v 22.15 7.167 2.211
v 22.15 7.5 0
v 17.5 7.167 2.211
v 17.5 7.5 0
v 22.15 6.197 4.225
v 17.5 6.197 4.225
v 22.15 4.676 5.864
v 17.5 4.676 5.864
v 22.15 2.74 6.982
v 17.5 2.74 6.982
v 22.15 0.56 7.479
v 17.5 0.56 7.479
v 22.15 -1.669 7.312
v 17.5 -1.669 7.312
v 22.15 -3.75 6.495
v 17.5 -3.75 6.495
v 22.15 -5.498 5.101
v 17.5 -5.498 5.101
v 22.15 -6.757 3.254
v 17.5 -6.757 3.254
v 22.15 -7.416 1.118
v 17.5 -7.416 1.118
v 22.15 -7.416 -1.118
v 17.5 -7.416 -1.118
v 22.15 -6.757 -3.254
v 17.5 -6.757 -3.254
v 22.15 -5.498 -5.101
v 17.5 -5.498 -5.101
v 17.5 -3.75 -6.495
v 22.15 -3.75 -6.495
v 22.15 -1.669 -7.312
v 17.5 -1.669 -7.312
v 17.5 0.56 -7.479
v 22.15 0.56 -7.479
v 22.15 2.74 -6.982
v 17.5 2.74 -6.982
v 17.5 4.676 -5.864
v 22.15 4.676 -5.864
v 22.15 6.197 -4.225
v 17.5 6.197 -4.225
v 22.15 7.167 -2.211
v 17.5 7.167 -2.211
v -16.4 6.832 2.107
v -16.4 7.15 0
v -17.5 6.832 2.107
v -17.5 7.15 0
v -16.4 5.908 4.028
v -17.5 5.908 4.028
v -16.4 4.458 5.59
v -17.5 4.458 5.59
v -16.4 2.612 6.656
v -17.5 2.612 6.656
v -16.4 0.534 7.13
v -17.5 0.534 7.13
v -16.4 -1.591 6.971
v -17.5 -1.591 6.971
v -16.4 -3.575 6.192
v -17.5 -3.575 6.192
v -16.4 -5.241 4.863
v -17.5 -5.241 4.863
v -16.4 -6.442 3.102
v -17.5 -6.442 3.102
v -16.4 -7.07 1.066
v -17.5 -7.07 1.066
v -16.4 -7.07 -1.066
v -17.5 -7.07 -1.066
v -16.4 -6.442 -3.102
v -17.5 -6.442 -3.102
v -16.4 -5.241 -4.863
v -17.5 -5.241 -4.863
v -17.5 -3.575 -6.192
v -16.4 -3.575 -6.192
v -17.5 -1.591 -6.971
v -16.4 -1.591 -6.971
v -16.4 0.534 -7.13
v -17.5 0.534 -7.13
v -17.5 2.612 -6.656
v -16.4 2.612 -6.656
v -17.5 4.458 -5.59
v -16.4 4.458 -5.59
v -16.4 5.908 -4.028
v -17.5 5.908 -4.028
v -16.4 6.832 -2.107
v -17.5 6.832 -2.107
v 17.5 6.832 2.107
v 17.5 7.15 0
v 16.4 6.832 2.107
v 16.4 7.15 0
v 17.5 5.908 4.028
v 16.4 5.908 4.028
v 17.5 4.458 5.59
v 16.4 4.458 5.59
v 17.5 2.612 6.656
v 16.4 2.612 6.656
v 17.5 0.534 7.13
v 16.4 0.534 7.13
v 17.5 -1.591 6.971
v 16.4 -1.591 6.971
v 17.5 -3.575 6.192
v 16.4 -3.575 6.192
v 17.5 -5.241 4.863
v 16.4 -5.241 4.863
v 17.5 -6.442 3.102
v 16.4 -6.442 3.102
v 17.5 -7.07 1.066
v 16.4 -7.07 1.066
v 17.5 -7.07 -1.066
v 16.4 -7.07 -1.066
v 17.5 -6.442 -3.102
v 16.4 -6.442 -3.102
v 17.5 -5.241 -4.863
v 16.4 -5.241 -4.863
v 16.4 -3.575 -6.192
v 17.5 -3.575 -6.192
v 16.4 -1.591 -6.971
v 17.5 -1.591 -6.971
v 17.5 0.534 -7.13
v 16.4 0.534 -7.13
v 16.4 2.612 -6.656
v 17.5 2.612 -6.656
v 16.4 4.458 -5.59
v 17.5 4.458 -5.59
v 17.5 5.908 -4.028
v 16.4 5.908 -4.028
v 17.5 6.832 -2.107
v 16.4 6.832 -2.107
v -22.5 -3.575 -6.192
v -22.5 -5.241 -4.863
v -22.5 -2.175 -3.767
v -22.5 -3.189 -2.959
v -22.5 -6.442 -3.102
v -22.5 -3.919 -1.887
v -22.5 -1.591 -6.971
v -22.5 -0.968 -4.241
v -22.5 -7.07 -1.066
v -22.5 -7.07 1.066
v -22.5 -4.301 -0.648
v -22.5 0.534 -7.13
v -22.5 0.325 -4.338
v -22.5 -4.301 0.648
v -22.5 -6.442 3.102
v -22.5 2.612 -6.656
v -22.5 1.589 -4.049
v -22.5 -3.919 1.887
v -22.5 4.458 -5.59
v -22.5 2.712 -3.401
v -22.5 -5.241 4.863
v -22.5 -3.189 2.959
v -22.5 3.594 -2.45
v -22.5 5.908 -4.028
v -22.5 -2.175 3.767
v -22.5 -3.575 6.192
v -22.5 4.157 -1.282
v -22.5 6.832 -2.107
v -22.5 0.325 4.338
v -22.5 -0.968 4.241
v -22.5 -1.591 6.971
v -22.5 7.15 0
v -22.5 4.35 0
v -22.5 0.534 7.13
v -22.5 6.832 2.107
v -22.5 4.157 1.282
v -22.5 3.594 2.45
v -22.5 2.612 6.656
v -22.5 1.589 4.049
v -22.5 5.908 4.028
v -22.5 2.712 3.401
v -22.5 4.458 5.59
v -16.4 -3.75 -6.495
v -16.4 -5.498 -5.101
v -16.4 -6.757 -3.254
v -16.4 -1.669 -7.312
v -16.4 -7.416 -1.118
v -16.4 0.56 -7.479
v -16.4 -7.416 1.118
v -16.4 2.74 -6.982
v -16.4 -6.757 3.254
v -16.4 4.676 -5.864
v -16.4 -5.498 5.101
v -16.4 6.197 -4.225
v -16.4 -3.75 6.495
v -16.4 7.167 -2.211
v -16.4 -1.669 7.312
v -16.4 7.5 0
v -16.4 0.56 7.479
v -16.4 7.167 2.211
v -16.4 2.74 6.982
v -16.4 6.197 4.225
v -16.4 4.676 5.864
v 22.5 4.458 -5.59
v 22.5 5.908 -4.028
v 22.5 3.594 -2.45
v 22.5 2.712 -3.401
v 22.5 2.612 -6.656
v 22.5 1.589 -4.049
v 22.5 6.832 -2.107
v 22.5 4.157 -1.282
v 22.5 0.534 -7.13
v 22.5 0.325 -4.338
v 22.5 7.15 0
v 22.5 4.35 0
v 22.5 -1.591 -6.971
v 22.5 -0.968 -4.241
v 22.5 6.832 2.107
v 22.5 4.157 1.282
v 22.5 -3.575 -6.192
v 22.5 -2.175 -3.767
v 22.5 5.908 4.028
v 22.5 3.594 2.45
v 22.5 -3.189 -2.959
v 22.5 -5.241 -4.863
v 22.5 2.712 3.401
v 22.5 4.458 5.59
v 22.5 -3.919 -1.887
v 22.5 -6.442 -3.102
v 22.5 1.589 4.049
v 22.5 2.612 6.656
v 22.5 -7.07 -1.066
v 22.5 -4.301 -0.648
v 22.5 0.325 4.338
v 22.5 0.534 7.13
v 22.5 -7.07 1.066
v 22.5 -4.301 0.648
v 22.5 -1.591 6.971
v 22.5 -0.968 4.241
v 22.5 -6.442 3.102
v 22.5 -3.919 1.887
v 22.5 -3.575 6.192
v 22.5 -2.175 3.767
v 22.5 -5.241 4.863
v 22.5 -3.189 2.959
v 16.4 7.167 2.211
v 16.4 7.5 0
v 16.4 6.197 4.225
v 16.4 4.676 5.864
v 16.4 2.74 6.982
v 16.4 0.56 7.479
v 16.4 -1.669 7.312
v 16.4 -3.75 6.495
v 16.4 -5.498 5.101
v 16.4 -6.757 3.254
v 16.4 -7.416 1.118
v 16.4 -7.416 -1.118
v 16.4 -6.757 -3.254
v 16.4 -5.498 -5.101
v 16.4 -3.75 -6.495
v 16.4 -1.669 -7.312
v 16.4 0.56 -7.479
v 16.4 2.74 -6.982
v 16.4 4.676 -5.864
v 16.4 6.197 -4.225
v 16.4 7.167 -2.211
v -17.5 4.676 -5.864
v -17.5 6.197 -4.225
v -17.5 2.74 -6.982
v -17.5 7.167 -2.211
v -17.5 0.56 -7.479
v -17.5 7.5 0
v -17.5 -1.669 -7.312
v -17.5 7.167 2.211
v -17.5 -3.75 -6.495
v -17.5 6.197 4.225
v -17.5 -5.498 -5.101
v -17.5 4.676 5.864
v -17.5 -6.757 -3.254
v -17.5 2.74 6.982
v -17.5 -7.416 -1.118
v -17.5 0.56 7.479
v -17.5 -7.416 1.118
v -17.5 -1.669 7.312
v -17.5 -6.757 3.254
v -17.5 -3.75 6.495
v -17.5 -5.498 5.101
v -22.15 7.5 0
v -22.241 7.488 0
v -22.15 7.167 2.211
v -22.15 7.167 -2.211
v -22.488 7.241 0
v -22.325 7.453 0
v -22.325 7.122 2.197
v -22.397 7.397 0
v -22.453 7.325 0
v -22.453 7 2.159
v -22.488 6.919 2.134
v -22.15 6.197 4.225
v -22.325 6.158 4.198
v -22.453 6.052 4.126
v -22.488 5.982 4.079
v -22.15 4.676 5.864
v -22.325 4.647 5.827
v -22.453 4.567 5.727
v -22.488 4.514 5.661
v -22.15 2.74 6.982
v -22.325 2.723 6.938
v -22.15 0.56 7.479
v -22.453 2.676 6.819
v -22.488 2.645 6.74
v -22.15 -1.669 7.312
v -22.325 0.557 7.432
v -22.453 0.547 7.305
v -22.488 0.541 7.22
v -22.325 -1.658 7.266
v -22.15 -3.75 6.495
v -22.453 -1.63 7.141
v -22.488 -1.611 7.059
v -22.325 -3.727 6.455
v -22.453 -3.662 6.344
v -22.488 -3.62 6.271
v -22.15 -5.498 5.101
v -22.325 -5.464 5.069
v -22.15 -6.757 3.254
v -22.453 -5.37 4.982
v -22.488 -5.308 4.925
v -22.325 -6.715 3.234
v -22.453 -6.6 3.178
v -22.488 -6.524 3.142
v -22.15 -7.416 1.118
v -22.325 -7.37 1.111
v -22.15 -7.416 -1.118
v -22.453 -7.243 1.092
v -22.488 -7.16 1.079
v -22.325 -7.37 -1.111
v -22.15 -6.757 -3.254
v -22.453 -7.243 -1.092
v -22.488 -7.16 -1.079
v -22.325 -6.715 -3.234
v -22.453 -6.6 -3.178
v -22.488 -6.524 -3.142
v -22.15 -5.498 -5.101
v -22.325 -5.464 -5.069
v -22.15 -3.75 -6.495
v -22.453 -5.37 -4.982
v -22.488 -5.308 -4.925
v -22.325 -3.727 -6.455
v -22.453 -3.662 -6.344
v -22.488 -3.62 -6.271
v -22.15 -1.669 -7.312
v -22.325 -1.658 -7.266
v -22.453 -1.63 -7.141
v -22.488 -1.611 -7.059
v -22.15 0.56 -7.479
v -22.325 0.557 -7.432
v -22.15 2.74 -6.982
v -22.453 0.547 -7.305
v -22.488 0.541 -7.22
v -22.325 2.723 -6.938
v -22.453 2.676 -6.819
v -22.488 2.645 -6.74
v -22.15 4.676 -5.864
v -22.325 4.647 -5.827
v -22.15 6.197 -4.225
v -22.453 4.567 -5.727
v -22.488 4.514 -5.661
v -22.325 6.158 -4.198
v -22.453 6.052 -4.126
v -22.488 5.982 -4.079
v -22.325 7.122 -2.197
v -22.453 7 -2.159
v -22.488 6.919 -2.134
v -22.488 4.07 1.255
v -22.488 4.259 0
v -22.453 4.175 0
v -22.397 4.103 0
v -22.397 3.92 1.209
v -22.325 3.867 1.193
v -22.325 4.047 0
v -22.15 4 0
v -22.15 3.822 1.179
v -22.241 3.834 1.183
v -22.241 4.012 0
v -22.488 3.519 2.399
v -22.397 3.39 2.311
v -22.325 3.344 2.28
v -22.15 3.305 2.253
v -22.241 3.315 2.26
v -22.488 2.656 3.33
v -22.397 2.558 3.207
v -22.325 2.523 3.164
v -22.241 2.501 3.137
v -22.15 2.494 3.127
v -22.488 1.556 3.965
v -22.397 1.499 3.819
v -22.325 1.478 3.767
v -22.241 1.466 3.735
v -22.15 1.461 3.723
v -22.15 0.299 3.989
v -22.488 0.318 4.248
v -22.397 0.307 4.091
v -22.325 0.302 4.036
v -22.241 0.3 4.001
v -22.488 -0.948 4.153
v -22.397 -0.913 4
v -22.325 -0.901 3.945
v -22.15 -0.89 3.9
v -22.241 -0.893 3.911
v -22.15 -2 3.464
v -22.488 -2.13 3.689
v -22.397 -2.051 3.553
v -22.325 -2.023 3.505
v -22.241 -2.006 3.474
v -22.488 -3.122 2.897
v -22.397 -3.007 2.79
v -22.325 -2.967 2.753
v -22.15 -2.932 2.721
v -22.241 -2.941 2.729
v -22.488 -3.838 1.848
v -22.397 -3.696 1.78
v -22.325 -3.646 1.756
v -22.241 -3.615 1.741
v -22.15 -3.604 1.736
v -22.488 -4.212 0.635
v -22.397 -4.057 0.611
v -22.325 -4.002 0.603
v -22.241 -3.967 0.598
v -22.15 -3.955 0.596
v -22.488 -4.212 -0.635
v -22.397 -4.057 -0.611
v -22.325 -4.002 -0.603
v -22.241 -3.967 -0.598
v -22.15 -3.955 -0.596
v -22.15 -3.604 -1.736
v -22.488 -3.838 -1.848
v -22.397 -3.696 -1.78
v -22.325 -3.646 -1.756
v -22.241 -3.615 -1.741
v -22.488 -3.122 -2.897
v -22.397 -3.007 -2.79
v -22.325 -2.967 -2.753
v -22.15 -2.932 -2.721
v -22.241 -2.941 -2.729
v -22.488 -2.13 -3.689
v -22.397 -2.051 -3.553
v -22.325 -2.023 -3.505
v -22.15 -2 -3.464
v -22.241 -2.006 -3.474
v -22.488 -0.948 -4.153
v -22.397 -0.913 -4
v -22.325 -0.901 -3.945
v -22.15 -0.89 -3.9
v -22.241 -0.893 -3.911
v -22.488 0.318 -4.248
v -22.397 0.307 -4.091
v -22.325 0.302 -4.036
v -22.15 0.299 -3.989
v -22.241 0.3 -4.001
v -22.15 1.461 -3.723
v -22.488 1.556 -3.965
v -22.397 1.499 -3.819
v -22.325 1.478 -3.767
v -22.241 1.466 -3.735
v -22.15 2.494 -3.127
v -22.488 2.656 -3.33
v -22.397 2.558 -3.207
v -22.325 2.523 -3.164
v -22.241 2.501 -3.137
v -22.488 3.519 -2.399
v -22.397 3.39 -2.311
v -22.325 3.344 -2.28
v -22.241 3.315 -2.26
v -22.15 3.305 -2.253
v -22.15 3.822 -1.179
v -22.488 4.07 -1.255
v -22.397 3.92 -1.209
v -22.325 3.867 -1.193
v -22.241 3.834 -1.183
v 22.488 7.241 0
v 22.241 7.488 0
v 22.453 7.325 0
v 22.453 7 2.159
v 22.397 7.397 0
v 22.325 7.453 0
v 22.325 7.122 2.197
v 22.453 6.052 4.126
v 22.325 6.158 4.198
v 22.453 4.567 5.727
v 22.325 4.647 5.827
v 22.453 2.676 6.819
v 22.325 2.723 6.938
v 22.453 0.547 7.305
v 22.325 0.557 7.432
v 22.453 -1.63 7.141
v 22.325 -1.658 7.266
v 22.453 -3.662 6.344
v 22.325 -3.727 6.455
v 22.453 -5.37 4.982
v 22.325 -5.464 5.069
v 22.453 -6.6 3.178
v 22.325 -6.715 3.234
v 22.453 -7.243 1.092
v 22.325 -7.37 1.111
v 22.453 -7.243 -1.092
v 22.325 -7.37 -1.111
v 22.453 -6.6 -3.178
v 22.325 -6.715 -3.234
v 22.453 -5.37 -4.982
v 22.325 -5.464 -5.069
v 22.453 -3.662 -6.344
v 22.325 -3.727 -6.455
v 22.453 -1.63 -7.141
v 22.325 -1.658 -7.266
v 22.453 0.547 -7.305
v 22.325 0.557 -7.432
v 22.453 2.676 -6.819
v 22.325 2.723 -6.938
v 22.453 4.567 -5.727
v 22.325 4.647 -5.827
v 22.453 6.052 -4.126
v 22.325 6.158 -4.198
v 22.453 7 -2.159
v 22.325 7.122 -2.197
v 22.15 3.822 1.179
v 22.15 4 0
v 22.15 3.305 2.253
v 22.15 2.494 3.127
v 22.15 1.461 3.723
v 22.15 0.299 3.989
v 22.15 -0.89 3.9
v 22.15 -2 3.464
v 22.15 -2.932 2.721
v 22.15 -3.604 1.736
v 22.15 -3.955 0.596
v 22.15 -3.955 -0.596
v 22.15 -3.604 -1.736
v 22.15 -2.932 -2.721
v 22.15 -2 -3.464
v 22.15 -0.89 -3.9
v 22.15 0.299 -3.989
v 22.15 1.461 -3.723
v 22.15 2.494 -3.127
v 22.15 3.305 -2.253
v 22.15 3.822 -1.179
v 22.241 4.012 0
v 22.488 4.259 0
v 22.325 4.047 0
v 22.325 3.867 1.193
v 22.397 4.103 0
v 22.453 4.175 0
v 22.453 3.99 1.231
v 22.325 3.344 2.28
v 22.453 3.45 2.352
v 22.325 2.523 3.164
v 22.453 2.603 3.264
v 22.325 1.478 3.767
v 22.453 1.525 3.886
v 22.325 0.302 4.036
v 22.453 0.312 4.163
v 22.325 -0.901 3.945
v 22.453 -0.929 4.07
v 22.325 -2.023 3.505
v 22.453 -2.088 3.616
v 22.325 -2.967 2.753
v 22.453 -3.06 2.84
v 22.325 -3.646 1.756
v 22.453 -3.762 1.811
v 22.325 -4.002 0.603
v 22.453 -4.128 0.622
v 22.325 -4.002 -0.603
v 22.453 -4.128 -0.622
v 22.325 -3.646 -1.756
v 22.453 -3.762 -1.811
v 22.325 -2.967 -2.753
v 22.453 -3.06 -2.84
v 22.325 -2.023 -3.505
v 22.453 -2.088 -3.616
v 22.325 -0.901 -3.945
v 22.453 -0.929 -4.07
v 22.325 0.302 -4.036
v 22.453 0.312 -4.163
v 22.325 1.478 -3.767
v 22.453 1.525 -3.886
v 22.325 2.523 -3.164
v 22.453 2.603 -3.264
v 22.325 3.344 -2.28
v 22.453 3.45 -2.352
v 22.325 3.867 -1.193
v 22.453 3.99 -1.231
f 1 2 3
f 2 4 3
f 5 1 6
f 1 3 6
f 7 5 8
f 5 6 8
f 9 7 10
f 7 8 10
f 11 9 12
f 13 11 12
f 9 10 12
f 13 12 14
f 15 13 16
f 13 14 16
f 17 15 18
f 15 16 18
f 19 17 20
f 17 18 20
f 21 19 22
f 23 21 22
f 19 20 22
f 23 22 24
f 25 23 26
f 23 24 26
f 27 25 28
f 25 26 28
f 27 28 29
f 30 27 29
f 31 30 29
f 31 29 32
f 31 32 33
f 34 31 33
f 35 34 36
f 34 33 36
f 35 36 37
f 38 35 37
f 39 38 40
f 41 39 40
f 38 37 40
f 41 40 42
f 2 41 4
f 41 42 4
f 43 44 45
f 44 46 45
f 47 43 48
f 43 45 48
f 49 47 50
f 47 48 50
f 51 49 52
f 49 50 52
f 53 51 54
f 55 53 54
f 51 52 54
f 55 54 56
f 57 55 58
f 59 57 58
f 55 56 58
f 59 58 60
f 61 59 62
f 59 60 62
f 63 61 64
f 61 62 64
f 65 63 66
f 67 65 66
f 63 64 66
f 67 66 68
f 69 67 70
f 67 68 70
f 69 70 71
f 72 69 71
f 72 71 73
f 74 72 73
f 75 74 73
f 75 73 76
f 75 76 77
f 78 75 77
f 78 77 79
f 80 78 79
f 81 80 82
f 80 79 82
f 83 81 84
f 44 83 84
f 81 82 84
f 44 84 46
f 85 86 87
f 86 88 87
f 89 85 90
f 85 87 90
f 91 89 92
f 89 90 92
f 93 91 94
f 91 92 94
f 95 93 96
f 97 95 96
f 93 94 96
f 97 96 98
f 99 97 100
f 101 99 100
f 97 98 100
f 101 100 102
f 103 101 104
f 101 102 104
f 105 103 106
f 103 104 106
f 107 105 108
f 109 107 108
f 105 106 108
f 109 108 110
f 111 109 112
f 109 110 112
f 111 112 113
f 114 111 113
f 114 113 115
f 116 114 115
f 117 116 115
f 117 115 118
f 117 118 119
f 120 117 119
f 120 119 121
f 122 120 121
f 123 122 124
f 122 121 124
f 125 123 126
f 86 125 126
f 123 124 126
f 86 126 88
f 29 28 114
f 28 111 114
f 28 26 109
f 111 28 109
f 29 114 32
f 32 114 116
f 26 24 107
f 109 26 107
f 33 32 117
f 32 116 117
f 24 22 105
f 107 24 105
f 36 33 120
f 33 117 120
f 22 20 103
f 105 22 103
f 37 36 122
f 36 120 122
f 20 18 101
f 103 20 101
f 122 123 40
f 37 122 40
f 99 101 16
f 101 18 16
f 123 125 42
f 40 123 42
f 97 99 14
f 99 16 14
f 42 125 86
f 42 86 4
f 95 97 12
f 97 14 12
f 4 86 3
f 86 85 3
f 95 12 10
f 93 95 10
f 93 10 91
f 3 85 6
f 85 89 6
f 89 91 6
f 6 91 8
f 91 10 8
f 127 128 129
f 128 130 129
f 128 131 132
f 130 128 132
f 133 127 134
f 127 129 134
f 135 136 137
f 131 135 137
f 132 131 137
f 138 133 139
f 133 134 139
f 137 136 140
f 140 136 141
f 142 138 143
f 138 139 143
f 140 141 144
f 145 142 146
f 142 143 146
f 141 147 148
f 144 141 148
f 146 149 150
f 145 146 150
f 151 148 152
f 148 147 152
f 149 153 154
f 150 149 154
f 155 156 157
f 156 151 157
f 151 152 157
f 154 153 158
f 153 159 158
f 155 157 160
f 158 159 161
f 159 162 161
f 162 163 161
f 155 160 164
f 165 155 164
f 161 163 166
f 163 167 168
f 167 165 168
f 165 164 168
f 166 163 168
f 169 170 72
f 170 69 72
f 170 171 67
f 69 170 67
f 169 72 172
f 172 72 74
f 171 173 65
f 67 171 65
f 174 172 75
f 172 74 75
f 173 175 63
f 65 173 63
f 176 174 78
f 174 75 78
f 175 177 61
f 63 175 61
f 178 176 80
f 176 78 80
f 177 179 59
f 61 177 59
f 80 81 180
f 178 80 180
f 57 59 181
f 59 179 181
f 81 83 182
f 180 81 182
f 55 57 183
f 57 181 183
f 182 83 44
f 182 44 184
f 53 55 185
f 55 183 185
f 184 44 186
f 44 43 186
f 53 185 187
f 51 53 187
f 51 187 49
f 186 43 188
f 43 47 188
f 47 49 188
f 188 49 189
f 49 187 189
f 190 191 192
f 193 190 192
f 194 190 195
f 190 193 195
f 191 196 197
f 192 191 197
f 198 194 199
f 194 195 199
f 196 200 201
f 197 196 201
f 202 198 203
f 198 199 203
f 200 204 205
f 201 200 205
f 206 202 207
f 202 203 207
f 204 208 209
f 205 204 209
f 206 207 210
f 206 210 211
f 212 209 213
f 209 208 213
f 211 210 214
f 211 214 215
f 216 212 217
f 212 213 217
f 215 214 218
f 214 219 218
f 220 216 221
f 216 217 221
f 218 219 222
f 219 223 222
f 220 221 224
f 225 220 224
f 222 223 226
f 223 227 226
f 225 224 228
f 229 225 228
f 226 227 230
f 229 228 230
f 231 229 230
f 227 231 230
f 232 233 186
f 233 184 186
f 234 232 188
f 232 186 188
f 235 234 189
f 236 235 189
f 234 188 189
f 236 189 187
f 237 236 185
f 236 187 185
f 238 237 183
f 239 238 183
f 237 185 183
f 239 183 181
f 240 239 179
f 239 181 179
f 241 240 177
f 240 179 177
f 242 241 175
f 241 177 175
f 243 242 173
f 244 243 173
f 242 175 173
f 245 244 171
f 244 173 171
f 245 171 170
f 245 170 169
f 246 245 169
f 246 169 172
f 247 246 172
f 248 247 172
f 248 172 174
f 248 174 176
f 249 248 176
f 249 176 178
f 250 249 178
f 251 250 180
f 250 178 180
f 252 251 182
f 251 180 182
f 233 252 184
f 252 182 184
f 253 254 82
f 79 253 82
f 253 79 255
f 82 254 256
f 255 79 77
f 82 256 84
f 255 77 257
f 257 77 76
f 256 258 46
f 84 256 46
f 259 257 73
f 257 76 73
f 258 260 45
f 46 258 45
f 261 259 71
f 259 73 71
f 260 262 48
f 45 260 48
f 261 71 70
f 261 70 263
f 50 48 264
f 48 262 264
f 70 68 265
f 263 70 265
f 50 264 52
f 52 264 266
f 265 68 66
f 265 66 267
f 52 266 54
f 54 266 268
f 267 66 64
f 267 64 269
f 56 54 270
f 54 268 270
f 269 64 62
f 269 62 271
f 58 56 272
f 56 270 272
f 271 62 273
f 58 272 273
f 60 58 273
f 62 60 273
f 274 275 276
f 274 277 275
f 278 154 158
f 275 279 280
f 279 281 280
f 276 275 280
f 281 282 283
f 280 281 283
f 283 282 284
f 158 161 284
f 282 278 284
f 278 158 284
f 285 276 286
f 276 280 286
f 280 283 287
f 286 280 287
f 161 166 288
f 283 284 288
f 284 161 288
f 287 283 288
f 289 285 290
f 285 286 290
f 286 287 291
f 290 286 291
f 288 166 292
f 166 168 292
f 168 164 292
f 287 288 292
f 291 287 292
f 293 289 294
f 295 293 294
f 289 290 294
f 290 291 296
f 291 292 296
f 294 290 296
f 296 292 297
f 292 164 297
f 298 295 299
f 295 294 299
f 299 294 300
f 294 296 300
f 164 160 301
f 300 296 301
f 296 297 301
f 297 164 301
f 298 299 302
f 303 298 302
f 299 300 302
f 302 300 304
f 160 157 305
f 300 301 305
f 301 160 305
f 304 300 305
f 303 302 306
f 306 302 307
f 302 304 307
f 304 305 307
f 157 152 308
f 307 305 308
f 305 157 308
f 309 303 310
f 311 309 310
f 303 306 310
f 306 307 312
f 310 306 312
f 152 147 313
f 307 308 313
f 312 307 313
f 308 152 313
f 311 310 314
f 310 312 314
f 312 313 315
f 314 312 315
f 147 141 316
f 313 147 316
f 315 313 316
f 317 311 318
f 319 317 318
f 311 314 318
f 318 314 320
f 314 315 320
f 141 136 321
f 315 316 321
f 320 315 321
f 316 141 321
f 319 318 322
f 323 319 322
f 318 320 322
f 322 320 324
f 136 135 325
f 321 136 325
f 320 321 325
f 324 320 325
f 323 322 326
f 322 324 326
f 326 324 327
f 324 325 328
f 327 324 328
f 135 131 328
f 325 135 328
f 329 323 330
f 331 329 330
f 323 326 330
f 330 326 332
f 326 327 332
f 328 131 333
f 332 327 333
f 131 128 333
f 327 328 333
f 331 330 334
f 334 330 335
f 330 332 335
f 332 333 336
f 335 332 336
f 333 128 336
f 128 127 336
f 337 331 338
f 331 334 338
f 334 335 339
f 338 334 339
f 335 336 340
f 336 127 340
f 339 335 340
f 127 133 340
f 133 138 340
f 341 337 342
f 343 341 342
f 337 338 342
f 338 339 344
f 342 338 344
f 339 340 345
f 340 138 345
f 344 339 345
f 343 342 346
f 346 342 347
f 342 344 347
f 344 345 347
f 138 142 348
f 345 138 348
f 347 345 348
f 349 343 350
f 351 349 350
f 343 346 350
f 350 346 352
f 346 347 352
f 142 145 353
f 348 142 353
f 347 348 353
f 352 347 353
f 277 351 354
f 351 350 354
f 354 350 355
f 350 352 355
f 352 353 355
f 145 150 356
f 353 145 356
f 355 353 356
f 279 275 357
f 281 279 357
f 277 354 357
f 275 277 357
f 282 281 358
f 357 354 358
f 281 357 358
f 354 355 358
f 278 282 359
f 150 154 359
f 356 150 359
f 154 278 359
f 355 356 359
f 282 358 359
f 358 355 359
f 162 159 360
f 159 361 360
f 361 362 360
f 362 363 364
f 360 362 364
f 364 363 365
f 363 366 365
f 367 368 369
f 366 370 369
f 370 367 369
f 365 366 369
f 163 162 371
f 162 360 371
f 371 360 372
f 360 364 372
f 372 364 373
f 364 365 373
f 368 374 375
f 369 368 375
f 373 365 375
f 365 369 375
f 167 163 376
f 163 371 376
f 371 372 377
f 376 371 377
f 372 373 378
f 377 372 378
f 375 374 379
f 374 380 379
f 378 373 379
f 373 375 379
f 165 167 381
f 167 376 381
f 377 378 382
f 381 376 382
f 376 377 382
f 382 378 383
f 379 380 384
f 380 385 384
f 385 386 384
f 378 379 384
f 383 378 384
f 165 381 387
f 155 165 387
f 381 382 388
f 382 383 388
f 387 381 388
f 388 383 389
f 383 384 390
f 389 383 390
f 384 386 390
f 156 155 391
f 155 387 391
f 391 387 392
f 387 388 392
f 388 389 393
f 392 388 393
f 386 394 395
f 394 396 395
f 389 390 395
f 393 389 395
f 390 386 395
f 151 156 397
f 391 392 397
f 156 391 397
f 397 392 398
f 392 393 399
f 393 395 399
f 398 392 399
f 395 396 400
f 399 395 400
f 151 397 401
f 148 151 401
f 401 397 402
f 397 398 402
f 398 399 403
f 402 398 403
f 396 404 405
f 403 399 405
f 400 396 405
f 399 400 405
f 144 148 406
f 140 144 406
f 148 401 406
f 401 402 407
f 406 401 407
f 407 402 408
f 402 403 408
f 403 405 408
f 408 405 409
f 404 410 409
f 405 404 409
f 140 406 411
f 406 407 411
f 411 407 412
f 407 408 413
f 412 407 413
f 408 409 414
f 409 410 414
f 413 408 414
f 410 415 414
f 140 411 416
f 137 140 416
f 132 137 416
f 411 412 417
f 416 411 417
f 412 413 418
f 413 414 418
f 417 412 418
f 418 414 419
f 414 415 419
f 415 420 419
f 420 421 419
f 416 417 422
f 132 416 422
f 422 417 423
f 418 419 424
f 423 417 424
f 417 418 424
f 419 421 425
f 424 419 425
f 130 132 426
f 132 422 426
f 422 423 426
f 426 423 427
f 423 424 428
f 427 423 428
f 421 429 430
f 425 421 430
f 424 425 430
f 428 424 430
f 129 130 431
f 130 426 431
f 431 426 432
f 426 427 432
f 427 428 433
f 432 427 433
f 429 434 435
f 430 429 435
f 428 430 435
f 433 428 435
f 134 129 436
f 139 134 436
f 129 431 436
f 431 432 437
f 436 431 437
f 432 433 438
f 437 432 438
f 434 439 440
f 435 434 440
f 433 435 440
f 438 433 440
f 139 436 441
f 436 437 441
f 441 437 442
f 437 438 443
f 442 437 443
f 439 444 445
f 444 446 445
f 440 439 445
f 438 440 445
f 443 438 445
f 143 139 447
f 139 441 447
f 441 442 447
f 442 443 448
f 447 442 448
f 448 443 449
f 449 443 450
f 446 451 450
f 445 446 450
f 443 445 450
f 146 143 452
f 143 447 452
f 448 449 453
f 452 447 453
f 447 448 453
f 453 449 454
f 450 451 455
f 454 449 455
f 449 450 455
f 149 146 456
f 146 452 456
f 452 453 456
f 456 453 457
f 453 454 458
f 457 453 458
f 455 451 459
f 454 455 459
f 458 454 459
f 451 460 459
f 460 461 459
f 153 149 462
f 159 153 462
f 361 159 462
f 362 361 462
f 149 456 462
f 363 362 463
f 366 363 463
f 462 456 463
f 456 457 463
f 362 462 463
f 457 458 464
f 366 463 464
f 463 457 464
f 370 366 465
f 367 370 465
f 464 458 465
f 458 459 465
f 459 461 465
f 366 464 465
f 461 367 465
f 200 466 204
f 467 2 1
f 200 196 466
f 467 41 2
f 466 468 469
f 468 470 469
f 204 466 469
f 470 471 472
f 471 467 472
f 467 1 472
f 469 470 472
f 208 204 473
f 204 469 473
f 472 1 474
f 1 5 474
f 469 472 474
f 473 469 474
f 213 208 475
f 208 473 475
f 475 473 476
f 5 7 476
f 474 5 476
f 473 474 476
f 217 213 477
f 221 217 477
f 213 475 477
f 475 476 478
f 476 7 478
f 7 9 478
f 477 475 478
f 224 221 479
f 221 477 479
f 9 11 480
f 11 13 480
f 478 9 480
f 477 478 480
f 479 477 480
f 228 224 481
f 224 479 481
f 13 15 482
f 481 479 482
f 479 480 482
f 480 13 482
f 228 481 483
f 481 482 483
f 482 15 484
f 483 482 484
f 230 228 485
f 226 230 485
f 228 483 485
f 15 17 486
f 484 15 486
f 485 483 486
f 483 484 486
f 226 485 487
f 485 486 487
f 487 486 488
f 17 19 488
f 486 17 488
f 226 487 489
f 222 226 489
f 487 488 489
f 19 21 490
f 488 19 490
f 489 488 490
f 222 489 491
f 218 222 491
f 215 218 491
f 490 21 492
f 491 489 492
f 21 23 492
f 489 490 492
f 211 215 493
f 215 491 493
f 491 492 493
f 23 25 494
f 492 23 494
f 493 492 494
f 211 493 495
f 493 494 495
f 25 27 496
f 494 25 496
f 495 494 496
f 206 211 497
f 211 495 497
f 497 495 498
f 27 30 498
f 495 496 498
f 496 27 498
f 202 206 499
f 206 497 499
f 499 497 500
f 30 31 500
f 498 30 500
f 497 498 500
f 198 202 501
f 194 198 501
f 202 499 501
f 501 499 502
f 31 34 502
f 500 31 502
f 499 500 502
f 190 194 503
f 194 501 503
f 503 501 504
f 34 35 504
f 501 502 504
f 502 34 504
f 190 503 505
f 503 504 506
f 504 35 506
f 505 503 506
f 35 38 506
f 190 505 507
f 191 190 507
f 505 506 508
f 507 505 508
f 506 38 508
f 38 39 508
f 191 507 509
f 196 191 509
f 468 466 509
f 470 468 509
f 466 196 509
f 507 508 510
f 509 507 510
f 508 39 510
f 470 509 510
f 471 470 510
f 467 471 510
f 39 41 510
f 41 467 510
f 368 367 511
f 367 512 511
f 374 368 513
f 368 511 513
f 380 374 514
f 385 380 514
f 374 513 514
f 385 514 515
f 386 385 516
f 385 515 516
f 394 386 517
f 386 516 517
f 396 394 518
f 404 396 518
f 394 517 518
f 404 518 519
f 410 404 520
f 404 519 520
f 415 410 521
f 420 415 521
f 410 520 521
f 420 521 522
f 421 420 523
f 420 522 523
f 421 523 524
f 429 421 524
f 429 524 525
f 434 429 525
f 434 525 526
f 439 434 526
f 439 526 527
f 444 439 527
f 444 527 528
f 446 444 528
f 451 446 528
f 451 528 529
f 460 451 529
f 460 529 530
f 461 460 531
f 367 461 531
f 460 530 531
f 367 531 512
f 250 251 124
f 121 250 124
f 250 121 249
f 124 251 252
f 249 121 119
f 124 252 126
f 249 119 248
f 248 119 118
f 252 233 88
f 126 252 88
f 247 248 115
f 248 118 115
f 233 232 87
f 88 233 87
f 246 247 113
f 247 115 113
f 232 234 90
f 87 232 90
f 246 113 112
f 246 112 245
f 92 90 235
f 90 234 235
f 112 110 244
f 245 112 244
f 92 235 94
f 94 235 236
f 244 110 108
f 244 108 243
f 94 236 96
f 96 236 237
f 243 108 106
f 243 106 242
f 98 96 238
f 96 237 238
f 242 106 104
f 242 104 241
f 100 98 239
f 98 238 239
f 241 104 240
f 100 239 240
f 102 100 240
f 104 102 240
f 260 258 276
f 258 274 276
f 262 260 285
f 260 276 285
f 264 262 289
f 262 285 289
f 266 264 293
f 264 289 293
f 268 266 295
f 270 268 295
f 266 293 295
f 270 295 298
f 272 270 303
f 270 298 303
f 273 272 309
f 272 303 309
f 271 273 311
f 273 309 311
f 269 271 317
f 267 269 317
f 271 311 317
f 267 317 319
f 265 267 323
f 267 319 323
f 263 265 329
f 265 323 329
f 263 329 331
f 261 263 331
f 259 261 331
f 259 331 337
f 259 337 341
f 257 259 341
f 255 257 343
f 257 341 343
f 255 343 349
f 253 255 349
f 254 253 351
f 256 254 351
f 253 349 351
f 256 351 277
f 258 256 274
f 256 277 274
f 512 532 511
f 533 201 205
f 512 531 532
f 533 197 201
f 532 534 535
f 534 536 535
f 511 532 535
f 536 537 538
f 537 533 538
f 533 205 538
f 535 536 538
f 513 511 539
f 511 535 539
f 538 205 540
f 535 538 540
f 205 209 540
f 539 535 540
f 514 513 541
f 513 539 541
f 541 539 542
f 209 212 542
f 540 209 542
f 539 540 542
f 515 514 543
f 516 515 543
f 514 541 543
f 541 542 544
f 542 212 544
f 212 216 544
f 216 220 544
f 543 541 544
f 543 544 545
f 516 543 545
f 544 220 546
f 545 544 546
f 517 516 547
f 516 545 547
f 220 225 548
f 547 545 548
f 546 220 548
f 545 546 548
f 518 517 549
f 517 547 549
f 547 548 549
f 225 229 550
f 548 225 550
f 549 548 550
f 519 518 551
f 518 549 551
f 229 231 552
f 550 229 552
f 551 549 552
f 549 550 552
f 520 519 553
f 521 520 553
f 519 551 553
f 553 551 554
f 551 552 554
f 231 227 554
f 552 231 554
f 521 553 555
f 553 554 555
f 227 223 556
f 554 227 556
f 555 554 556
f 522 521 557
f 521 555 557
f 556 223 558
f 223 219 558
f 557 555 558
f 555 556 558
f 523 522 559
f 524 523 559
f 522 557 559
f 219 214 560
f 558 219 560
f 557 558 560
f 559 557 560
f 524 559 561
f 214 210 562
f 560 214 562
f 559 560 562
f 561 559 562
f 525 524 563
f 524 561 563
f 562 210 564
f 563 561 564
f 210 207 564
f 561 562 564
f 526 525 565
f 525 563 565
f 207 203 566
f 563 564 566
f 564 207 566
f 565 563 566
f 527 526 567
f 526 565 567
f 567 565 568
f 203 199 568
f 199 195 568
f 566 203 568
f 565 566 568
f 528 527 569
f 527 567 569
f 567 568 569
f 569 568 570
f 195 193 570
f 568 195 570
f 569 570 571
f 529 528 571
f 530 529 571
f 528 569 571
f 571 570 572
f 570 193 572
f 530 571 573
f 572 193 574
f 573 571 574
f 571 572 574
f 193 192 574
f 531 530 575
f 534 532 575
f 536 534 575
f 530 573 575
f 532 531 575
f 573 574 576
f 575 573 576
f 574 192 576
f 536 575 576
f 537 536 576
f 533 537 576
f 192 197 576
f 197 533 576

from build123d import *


with BuildPart() as f1:
    # F0 (on Top) → F1 (revolve)
    with BuildSketch(Plane.XY):
        with BuildLine():
            Line((-17.5, 7.5), (-22.15, 7.5))
            ThreePointArc((-22.15, 7.5), (-22.397487, 7.397487), (-22.5, 7.15))
            Line((-22.5, 7.15), (-22.5, 4.35))
            ThreePointArc((-22.5, 4.35), (-22.397487, 4.102513), (-22.15, 4))
            Line((-22.15, 4), (22.15, 4))
            ThreePointArc((22.15, 4), (22.397487, 4.102513), (22.5, 4.35))
            Line((22.5, 4.35), (22.5, 7.15))
            ThreePointArc((22.5, 7.15), (22.397487, 7.397487), (22.15, 7.5))
            Line((22.15, 7.5), (17.5, 7.5))
            Line((17.5, 7.5), (17.5, 7.15))
            Line((17.5, 7.15), (16.4, 7.15))
            Line((16.4, 7.15), (16.4, 7.5))
            Line((16.4, 7.5), (-16.4, 7.5))
            Line((-16.4, 7.5), (-16.4, 7.15))
            Line((-16.4, 7.15), (-17.5, 7.15))
            Line((-17.5, 7.15), (-17.5, 7.5))
        make_face()
    revolve(axis=Axis((0, 0, 0), (1, 0, 0)))


solid = f1.part
